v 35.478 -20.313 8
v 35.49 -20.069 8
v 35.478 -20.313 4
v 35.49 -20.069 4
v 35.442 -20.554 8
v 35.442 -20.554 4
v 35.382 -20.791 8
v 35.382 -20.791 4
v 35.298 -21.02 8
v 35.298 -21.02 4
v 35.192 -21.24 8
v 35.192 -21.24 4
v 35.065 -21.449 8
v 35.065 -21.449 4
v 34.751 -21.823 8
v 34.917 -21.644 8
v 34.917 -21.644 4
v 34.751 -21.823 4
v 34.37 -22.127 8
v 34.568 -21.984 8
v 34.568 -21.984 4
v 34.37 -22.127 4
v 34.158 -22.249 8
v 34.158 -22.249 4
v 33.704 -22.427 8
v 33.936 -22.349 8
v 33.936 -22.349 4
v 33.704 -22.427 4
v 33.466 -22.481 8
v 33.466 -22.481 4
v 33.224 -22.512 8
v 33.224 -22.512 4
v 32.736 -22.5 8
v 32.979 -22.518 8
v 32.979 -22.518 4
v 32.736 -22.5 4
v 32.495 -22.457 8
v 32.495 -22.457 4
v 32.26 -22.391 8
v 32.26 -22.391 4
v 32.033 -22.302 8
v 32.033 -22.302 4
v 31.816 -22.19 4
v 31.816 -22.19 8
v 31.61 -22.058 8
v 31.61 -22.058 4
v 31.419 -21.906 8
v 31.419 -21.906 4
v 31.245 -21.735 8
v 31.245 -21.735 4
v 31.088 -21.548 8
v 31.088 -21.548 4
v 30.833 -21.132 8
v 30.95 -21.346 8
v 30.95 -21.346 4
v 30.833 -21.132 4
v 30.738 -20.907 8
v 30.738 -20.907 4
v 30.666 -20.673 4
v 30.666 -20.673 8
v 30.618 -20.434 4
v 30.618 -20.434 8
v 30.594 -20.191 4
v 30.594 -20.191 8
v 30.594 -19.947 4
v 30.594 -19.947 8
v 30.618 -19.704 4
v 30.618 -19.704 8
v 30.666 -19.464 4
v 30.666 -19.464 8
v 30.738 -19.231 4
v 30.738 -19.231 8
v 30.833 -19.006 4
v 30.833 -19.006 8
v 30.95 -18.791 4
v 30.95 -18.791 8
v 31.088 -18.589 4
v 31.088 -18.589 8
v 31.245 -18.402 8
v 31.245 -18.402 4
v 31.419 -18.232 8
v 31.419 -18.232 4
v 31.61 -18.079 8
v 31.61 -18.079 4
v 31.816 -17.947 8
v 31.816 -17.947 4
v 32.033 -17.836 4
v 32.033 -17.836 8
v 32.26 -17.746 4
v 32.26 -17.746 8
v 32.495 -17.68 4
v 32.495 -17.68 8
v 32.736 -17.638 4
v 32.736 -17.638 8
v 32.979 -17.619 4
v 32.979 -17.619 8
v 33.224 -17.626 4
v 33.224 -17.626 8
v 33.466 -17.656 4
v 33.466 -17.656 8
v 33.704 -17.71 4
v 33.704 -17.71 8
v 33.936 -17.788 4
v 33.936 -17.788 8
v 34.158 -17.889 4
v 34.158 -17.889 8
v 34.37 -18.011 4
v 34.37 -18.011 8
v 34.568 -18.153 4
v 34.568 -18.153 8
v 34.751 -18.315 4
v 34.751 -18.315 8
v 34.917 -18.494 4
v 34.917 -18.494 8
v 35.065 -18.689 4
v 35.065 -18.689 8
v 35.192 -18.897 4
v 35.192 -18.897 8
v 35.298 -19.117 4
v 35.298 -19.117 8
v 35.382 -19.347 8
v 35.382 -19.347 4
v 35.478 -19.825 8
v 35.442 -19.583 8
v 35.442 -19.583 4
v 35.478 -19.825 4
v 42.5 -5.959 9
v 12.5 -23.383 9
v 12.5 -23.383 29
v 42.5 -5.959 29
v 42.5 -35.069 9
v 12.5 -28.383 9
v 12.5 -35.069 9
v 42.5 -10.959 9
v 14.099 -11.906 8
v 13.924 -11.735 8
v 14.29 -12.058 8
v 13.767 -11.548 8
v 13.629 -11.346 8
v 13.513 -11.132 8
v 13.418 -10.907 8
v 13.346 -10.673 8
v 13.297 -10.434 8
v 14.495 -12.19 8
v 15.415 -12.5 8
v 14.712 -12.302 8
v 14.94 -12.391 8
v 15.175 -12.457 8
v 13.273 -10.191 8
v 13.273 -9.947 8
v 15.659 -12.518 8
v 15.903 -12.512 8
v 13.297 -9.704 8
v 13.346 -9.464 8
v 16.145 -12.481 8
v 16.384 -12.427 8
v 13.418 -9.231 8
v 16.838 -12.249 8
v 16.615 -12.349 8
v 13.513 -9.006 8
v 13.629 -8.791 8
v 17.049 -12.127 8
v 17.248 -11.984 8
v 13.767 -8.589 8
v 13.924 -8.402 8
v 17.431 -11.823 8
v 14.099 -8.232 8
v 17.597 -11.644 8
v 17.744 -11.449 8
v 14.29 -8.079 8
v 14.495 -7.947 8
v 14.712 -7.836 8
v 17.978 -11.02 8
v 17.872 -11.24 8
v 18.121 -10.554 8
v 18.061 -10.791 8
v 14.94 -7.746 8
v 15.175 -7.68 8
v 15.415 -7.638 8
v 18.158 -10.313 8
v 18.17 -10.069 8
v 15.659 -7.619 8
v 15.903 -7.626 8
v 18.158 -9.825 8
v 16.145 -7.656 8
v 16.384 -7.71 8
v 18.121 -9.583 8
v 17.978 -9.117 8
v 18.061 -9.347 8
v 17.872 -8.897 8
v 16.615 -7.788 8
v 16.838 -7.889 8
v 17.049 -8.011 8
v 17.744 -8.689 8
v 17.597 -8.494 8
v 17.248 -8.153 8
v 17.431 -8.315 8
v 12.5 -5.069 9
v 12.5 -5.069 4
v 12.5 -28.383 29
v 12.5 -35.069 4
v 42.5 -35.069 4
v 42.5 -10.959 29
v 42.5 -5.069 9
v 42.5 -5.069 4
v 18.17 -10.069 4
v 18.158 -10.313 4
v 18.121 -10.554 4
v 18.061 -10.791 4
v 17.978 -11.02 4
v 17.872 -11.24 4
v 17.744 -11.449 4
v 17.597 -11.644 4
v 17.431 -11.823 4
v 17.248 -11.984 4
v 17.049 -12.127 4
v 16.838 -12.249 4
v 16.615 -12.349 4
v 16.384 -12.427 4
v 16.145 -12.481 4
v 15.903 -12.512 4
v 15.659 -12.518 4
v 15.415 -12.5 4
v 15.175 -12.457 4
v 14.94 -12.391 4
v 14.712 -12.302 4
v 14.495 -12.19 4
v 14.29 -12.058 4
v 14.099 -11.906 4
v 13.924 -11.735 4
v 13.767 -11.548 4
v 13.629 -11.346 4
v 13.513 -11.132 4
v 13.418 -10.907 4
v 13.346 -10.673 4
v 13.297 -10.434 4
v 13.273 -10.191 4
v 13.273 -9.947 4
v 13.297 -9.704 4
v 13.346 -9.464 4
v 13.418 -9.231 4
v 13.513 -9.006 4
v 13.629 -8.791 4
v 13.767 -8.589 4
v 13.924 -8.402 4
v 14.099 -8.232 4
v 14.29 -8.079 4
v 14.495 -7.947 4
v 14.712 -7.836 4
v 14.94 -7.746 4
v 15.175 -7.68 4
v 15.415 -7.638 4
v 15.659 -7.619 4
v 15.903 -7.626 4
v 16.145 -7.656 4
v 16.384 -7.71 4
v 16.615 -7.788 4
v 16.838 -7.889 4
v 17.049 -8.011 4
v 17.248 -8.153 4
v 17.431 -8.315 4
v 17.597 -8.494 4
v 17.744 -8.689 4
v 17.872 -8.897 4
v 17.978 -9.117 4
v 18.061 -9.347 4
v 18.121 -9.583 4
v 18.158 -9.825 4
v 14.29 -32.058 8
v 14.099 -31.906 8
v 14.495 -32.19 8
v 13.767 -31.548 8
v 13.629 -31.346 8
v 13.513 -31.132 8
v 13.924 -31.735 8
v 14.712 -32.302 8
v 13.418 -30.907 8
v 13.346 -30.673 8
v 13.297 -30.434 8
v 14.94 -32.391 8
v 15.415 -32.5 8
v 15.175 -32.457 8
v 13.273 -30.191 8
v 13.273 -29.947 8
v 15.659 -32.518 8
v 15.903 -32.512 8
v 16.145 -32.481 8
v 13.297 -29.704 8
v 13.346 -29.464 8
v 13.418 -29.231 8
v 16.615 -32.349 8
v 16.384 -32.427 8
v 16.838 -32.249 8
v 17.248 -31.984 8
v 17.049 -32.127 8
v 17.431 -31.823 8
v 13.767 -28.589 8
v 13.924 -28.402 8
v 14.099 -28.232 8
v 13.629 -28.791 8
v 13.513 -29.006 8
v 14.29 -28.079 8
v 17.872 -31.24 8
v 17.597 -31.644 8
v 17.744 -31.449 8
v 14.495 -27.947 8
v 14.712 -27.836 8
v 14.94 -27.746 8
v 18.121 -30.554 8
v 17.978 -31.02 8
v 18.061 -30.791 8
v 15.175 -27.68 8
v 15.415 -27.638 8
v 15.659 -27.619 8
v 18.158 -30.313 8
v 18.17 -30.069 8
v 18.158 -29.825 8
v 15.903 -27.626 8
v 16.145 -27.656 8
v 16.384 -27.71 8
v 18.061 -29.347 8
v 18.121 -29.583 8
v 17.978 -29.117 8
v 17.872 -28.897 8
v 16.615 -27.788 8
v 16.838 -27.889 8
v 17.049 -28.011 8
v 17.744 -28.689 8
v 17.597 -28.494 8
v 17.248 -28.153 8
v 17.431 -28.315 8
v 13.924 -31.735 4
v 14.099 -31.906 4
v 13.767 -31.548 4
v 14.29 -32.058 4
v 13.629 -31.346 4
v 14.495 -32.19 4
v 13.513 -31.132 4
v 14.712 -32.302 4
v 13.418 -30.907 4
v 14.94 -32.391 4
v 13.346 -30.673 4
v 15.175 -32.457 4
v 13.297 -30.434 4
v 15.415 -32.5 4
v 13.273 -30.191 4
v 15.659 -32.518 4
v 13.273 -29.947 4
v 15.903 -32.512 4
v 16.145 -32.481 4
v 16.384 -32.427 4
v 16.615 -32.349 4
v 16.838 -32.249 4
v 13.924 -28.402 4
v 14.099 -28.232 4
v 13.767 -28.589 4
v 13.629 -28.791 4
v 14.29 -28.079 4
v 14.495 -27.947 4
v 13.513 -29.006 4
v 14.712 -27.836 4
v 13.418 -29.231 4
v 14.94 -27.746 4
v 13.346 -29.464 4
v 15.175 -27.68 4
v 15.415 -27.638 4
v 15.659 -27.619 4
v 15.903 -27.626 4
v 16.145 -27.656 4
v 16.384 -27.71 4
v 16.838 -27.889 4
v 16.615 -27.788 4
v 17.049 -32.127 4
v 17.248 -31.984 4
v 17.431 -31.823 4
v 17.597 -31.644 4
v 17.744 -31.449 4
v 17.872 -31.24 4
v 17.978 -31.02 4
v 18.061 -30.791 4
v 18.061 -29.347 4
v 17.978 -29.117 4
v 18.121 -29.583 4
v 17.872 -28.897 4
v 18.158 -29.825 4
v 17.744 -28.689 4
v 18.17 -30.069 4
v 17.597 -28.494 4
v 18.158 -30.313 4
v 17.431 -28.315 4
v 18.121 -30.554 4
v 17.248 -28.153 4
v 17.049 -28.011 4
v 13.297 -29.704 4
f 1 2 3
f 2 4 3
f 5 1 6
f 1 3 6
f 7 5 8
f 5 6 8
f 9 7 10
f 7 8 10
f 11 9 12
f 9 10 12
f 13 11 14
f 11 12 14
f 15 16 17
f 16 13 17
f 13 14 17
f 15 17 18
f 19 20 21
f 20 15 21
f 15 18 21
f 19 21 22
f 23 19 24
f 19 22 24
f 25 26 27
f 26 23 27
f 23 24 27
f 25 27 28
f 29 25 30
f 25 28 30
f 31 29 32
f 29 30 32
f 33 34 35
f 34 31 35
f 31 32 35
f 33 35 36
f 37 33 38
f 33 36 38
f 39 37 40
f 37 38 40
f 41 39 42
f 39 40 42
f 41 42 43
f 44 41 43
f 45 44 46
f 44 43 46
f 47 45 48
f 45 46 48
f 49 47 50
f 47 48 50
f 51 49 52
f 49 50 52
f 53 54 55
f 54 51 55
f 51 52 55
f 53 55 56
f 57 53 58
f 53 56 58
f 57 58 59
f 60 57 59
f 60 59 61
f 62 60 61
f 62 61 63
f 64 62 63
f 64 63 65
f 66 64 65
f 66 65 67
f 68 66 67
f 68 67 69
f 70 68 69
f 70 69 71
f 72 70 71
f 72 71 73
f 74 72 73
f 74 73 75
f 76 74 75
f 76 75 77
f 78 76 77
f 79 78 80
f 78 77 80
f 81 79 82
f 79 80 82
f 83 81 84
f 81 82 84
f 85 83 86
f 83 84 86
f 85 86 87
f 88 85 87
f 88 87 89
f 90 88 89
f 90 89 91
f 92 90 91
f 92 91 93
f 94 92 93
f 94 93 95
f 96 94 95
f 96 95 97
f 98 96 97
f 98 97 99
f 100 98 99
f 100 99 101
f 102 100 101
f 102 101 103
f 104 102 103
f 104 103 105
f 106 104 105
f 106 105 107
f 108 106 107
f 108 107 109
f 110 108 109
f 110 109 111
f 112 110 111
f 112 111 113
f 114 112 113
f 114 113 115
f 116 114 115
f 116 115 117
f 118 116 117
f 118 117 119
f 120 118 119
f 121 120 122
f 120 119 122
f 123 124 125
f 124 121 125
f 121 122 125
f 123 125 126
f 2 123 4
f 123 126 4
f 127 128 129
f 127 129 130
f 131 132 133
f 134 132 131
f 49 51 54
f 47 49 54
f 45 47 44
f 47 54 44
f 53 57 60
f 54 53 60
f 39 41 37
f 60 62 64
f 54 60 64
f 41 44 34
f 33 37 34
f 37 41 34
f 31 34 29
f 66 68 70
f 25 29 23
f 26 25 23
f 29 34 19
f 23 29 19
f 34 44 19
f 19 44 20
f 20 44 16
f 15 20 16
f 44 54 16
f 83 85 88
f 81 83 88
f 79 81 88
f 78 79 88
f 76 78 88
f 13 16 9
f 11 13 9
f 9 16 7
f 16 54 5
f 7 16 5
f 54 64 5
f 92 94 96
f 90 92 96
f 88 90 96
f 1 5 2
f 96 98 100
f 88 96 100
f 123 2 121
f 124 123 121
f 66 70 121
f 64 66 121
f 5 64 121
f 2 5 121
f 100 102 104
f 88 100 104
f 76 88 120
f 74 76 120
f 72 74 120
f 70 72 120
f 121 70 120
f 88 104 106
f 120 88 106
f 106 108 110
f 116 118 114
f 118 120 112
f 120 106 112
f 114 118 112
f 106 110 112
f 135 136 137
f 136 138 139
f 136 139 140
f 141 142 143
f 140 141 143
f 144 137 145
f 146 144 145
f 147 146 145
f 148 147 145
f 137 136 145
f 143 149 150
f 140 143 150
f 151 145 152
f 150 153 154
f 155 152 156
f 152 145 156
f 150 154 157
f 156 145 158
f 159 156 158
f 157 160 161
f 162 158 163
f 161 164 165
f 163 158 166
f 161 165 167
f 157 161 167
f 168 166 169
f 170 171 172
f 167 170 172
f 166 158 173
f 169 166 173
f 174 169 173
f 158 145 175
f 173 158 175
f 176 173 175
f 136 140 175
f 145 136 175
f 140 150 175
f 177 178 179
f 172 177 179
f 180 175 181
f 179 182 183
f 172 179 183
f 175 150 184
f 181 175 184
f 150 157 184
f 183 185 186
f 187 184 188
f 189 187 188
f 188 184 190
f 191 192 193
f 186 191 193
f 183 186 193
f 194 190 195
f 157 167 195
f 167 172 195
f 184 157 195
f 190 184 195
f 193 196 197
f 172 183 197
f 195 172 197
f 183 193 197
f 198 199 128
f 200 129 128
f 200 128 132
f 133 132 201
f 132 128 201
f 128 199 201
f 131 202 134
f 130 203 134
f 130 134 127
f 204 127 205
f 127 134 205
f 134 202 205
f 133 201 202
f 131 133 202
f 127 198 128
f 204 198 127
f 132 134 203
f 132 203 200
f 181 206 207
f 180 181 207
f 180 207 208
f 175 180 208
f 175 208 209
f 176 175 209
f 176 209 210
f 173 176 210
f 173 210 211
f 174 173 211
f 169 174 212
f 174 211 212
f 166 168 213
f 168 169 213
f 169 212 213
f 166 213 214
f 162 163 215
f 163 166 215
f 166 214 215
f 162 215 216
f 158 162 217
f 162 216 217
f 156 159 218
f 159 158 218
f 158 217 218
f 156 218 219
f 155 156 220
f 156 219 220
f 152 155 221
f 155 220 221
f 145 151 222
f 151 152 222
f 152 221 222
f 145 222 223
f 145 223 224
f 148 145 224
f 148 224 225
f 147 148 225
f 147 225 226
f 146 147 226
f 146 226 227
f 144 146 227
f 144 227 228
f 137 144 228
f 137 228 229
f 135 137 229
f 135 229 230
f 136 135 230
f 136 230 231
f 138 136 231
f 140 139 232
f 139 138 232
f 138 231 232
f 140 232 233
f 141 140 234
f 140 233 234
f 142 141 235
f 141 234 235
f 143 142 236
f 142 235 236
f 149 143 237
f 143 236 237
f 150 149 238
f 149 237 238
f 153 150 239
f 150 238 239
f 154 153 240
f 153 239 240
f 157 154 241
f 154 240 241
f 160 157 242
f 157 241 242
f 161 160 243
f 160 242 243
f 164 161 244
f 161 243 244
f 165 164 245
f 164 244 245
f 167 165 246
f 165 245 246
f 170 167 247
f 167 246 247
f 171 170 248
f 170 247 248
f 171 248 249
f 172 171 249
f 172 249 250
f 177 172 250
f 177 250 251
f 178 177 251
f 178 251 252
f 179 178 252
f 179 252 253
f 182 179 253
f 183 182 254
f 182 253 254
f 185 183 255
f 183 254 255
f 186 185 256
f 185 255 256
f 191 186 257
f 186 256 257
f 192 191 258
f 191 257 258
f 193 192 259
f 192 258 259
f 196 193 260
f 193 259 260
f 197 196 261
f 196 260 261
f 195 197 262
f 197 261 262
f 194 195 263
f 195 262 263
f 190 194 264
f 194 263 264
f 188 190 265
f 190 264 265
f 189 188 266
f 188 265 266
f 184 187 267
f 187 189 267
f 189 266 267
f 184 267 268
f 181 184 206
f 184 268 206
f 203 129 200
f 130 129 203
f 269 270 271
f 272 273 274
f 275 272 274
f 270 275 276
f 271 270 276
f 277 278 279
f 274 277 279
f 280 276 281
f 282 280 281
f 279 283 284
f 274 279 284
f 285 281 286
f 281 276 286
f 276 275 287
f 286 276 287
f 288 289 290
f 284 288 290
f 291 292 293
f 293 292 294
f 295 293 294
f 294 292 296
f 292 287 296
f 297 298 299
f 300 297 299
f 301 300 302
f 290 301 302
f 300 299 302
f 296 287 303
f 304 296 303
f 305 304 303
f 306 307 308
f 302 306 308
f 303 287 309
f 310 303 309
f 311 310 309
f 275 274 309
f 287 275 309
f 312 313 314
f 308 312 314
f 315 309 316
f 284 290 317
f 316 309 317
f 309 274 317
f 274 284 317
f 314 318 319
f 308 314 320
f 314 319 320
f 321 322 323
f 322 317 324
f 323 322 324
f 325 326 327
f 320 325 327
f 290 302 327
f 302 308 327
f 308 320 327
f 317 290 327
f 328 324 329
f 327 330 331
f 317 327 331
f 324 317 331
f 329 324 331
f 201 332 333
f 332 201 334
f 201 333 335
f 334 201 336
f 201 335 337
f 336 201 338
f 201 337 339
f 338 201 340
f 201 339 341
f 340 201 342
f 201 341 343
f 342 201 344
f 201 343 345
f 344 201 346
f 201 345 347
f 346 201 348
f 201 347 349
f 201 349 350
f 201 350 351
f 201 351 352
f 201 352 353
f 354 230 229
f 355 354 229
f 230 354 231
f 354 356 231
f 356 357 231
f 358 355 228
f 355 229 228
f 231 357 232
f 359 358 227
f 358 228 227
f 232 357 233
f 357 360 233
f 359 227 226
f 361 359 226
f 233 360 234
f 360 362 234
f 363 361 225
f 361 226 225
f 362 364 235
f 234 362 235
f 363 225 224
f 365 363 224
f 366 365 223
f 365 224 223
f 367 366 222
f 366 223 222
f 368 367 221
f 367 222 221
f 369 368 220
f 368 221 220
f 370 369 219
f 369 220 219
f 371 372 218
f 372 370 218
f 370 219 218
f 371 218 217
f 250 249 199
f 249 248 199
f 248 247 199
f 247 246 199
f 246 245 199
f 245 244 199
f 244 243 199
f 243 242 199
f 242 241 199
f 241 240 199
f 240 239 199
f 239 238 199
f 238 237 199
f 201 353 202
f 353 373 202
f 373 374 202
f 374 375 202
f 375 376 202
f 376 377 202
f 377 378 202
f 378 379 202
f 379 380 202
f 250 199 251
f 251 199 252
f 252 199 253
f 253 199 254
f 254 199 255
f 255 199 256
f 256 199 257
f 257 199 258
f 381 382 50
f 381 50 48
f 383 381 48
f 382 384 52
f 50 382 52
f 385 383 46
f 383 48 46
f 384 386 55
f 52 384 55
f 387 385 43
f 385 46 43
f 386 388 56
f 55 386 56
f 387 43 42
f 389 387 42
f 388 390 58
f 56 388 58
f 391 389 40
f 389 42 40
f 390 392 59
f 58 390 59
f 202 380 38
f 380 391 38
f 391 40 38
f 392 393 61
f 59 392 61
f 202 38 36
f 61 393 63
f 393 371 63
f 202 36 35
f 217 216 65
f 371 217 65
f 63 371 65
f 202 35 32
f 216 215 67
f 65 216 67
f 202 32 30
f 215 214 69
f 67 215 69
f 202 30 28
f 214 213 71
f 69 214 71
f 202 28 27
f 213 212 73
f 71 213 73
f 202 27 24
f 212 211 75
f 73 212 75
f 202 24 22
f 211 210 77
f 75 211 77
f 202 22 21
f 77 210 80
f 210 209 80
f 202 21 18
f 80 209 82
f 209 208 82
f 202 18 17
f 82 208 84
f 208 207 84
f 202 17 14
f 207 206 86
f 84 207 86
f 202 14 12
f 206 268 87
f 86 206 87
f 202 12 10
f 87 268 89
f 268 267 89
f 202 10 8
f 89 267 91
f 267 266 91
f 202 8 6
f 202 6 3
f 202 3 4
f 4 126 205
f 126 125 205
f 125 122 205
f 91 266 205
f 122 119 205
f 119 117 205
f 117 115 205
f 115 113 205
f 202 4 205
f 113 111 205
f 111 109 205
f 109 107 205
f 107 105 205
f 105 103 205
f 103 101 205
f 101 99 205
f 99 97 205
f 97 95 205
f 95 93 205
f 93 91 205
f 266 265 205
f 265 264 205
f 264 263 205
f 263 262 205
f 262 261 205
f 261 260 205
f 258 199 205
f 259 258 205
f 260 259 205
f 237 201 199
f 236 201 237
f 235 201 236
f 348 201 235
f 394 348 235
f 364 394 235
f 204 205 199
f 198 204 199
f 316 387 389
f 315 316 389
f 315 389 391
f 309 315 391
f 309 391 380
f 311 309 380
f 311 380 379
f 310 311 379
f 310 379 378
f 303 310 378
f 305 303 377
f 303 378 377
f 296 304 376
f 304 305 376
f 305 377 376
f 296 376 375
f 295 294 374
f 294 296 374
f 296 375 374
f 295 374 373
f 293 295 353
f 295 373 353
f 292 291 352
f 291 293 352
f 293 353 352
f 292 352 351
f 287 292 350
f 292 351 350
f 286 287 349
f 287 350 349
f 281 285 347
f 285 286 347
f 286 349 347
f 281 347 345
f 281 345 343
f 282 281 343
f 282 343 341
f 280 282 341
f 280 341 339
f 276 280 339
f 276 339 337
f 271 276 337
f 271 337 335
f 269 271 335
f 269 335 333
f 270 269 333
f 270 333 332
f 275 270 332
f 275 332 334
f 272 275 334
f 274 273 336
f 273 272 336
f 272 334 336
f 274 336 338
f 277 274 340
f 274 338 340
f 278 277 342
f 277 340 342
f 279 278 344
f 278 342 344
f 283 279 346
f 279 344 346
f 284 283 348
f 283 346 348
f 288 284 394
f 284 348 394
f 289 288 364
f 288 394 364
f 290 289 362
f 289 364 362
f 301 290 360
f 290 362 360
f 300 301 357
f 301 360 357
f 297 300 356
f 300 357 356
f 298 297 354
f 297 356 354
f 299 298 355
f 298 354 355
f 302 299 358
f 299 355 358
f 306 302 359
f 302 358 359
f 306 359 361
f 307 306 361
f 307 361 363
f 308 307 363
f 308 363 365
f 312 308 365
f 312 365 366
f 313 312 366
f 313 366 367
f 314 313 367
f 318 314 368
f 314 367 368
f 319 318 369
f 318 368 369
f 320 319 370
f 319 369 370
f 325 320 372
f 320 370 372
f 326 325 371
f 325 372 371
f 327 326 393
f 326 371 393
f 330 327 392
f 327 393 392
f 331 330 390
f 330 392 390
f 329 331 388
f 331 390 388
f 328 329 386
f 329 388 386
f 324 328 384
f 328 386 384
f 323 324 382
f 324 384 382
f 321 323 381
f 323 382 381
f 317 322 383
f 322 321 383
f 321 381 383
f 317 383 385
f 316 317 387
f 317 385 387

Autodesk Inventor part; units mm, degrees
ref_plane "YZ Plane" through (0, 0, 0) normal (1, 0, 0) x (0, 1, 0)
ref_plane "XZ Plane" through (0, 0, 0) normal (0, 1, 0) x (-1, 0, 0)
ref_plane "XY Plane" through (0, 0, 0) normal (0, 0, 1) x (1, 0, 0)
ref_plane "Arbeitsebene1" through (0, 0, 4) normal (0, 0, 1) x (1, 0, 0)
sketch "Skizze1" plane through (0, 0, 4) normal (0, 0, 1) x (1, 0, 0)
  circle A0 centre (33.0405, -20.0687) radius 1.4 projected
  circle A1 centre (15.72, -10.0687) radius 1.4 projected
  circle A2 centre (15.72, -30.0687) radius 1.4 projected
  line L0 (0, -18.4687) -> (28.3951, -18.4687) projected
  arc A3 (28.3951, -21.6687) -> (28.3951, -18.4687) centre (28.3951, -20.0687) ccw projected
  line L1 (28.3951, -21.6687) -> (0, -21.6687) projected
  line L2 (0, -36.0687) -> (0, -21.6687) projected
  line L3 (0, -36.0687) -> (55, -36.0687) projected
  line L4 (55, -36.0687) -> (55, -6.0687) projected
  line L5 (55, -6.0687) -> (60, -6.0687) projected
  line L6 (60, 0) -> (60, -6.0687) projected
  line L7 (0, 0) -> (60, 0) projected
  line L8 (0, -18.4687) -> (0, 0) projected
  line L9 (12.5, -35.0687) -> (42.5, -35.0687)
  line L10 (42.5, -35.0687) -> (42.5, -5.0687)
  line L11 (42.5, -5.0687) -> (12.5, -5.0687)
  line L12 (12.5, -5.0687) -> (12.5, -35.0687)
  line L13 (12.5, -35.0687) -> (42.5, -5.0687) construction
  line L14 (42.5, -35.0687) -> (12.5, -5.0687) construction
  circle A4 centre (33.0405, -20.0687) radius 2.45
  circle A5 centre (15.72, -10.0687) radius 2.45
  circle A6 centre (15.72, -30.0687) radius 2.45
  line L15 (12.5, -18.4687) -> (12.5, -21.6687)
  point P0 (27.5, -20.0687)
  point P1 (18.7387, -21.6687)
  point P2 (11.6841, -36.0687)
  point P3 (46.6841, -36.0687)
  point P4 (18.7387, -18.4687)
  dimension "d0" = 30
  dimension "d1" = 30
  dimension "d2" = 4.9
  dimension "d3" = 4.9
  dimension "d4" = 4.9
extrude "Extrusion1" add sketch "Skizze1" along normal blind 4 contours L12 L11 L10 L9 L1 A3 L0 | L0 A3 L1 L12
sketch "Skizze2" plane through (0, 0, 8) normal (0, 0, 1) x (1, 0, 0)
  line L0 (12.5, -5.0687) -> (12.5, -35.0687) projected
  line L1 (42.5, -35.0687) -> (42.5, -5.0687) projected
  line L2 (42.5, -5.0687) -> (12.5, -5.0687) projected
  circle A0 centre (33.0405, -20.0687) radius 2.45 projected
  line L3 (12.5, -35.0687) -> (42.5, -35.0687) projected
  point P0 (0, 0)
extrude "Extrusion2" add sketch "Skizze2" along normal blind 1 contours L2 L1 L3 L0 | A0
sketch "Skizze3" plane through (0, 0, 9) normal (0, 0, 1) x (1, 0, 0)
  line L0 (12.5, -35.0687) -> (42.5, -35.0687) projected
  line L1 (42.5, -35.0687) -> (42.5, -5.0687) projected
  line L2 (42.5, -5.0687) -> (12.5, -5.0687) projected
  line L3 (12.5, -5.0687) -> (12.5, -35.0687) projected
  line L4 (37.9557, 14.9579) -> (17.8567, -20.2718) projected
  line L5 (17.8567, -20.2718) -> (-3.0822, -20.2721) projected
  line L6 (15.4322, -16.0975) -> (22.0334, -27.4633)
  line L7 (12.5, -5.0687) -> (12.5, -35.0687) projected
  line L8 (12.5, -23.3829) -> (44.0331, -5.0687)
  line L9 (42.5, -35.0687) -> (42.5, -5.0687) projected
  line L10 (42.5, -5.9591) -> (42.5, -10.9591)
  line L11 (42.5, -10.9591) -> (12.5, -28.3829)
  point P0 (0, 0)
  point P1 (42.5, -5.9591)
  point P2 (12.5, -28.3829)
  dimension "d9" = 119.706
  dimension "d10" = 59.853
  dimension "d11" = 5
extrude "Extrusion3" add sketch "Skizze3" along normal blind 20 contours L3 L8 L6 L11 | L11 L6 L8 L1
equation "\"d10\" = 0.5 * d9"
properties part number "cellSTORM_Flipmirror"
